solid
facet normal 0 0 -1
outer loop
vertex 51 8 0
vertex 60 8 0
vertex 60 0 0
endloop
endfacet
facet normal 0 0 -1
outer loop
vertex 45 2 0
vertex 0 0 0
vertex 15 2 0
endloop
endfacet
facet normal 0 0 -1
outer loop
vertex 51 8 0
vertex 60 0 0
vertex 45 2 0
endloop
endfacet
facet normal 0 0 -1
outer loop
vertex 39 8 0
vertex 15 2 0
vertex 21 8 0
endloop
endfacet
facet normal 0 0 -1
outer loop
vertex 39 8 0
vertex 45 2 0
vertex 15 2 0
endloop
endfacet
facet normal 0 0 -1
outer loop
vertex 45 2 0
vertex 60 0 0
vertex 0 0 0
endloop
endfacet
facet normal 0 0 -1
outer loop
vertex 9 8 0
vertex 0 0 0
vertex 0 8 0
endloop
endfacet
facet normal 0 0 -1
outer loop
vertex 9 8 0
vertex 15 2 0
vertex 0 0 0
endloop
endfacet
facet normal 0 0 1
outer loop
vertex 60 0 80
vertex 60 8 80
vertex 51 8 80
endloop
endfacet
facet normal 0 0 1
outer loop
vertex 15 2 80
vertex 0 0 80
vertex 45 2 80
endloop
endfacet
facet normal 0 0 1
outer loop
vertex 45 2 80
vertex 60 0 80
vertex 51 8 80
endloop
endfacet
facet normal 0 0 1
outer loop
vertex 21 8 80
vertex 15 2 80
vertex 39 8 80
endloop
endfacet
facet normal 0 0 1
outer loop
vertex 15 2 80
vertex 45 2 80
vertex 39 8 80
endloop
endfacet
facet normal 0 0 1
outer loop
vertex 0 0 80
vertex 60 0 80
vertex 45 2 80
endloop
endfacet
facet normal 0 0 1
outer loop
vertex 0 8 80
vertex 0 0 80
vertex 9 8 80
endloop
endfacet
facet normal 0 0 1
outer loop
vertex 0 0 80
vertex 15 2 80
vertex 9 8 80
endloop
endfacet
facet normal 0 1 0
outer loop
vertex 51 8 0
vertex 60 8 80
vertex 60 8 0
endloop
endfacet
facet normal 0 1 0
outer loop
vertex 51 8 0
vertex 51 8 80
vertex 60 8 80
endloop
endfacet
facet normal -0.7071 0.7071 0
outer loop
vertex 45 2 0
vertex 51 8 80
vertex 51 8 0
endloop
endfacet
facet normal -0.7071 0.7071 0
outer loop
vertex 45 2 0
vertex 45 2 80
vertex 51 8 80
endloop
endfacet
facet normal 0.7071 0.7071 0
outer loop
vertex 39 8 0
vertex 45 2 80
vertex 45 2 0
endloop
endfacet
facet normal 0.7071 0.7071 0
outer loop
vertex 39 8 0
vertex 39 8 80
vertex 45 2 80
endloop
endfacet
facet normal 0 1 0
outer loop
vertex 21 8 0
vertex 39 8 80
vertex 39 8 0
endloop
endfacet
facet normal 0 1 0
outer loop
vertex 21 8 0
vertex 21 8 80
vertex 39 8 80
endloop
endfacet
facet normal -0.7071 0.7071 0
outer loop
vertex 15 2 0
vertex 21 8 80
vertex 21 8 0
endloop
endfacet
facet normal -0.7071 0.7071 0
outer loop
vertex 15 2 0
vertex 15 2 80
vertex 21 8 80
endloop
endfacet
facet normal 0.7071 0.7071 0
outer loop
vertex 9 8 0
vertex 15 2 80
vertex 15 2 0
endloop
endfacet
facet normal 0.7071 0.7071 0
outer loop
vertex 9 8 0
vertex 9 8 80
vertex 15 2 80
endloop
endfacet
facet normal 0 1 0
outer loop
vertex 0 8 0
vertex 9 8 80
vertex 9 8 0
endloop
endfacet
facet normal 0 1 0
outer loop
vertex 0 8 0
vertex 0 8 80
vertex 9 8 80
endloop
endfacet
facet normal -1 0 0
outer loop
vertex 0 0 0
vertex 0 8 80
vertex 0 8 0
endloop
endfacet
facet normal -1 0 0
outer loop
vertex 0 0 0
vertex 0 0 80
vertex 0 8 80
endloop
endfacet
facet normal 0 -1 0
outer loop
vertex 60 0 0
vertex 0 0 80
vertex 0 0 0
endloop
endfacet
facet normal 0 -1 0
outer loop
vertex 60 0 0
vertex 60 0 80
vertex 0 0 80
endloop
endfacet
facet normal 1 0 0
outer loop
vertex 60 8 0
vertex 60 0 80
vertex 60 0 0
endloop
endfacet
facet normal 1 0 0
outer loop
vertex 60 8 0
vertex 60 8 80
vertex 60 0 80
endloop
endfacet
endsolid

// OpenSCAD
$fn = 32;

// ----------------------------------------------------------------------
// V guide rail: doublev, 60 mm wide
// ----------------------------------------------------------------------

// --- parameters (mm) ---
rail_w = 60;              // rail width, X
base_t = 8;               // base plate thickness
v_depth = 6;              // V feature depth / height
v_half_w = 12;            // half width of the V at the base face
plate_t = 80;             // rail length, Z (the extrusion height)
groove_off = 15;          // offset of each groove from the centreline
fit_tol = 0.1;            // declared fit tolerance (prompt contract)
free_tol = 0.5;           // declared free tolerance (prompt contract)

centre_x = rail_w / 2;  // rail centreline
groove_a = centre_x - groove_off;  // axis of the first groove
groove_b = centre_x + groove_off;  // axis of the second groove

profile = [[0, 0], [60, 0], [60, 8], [51, 8], [45, 2], [39, 8], [21, 8], [15, 2], [9, 8], [0, 8]];  // primary outline, 10 points, counter clockwise

// --- the one profile operation ---
linear_extrude(height = plate_t) polygon(points = profile);
